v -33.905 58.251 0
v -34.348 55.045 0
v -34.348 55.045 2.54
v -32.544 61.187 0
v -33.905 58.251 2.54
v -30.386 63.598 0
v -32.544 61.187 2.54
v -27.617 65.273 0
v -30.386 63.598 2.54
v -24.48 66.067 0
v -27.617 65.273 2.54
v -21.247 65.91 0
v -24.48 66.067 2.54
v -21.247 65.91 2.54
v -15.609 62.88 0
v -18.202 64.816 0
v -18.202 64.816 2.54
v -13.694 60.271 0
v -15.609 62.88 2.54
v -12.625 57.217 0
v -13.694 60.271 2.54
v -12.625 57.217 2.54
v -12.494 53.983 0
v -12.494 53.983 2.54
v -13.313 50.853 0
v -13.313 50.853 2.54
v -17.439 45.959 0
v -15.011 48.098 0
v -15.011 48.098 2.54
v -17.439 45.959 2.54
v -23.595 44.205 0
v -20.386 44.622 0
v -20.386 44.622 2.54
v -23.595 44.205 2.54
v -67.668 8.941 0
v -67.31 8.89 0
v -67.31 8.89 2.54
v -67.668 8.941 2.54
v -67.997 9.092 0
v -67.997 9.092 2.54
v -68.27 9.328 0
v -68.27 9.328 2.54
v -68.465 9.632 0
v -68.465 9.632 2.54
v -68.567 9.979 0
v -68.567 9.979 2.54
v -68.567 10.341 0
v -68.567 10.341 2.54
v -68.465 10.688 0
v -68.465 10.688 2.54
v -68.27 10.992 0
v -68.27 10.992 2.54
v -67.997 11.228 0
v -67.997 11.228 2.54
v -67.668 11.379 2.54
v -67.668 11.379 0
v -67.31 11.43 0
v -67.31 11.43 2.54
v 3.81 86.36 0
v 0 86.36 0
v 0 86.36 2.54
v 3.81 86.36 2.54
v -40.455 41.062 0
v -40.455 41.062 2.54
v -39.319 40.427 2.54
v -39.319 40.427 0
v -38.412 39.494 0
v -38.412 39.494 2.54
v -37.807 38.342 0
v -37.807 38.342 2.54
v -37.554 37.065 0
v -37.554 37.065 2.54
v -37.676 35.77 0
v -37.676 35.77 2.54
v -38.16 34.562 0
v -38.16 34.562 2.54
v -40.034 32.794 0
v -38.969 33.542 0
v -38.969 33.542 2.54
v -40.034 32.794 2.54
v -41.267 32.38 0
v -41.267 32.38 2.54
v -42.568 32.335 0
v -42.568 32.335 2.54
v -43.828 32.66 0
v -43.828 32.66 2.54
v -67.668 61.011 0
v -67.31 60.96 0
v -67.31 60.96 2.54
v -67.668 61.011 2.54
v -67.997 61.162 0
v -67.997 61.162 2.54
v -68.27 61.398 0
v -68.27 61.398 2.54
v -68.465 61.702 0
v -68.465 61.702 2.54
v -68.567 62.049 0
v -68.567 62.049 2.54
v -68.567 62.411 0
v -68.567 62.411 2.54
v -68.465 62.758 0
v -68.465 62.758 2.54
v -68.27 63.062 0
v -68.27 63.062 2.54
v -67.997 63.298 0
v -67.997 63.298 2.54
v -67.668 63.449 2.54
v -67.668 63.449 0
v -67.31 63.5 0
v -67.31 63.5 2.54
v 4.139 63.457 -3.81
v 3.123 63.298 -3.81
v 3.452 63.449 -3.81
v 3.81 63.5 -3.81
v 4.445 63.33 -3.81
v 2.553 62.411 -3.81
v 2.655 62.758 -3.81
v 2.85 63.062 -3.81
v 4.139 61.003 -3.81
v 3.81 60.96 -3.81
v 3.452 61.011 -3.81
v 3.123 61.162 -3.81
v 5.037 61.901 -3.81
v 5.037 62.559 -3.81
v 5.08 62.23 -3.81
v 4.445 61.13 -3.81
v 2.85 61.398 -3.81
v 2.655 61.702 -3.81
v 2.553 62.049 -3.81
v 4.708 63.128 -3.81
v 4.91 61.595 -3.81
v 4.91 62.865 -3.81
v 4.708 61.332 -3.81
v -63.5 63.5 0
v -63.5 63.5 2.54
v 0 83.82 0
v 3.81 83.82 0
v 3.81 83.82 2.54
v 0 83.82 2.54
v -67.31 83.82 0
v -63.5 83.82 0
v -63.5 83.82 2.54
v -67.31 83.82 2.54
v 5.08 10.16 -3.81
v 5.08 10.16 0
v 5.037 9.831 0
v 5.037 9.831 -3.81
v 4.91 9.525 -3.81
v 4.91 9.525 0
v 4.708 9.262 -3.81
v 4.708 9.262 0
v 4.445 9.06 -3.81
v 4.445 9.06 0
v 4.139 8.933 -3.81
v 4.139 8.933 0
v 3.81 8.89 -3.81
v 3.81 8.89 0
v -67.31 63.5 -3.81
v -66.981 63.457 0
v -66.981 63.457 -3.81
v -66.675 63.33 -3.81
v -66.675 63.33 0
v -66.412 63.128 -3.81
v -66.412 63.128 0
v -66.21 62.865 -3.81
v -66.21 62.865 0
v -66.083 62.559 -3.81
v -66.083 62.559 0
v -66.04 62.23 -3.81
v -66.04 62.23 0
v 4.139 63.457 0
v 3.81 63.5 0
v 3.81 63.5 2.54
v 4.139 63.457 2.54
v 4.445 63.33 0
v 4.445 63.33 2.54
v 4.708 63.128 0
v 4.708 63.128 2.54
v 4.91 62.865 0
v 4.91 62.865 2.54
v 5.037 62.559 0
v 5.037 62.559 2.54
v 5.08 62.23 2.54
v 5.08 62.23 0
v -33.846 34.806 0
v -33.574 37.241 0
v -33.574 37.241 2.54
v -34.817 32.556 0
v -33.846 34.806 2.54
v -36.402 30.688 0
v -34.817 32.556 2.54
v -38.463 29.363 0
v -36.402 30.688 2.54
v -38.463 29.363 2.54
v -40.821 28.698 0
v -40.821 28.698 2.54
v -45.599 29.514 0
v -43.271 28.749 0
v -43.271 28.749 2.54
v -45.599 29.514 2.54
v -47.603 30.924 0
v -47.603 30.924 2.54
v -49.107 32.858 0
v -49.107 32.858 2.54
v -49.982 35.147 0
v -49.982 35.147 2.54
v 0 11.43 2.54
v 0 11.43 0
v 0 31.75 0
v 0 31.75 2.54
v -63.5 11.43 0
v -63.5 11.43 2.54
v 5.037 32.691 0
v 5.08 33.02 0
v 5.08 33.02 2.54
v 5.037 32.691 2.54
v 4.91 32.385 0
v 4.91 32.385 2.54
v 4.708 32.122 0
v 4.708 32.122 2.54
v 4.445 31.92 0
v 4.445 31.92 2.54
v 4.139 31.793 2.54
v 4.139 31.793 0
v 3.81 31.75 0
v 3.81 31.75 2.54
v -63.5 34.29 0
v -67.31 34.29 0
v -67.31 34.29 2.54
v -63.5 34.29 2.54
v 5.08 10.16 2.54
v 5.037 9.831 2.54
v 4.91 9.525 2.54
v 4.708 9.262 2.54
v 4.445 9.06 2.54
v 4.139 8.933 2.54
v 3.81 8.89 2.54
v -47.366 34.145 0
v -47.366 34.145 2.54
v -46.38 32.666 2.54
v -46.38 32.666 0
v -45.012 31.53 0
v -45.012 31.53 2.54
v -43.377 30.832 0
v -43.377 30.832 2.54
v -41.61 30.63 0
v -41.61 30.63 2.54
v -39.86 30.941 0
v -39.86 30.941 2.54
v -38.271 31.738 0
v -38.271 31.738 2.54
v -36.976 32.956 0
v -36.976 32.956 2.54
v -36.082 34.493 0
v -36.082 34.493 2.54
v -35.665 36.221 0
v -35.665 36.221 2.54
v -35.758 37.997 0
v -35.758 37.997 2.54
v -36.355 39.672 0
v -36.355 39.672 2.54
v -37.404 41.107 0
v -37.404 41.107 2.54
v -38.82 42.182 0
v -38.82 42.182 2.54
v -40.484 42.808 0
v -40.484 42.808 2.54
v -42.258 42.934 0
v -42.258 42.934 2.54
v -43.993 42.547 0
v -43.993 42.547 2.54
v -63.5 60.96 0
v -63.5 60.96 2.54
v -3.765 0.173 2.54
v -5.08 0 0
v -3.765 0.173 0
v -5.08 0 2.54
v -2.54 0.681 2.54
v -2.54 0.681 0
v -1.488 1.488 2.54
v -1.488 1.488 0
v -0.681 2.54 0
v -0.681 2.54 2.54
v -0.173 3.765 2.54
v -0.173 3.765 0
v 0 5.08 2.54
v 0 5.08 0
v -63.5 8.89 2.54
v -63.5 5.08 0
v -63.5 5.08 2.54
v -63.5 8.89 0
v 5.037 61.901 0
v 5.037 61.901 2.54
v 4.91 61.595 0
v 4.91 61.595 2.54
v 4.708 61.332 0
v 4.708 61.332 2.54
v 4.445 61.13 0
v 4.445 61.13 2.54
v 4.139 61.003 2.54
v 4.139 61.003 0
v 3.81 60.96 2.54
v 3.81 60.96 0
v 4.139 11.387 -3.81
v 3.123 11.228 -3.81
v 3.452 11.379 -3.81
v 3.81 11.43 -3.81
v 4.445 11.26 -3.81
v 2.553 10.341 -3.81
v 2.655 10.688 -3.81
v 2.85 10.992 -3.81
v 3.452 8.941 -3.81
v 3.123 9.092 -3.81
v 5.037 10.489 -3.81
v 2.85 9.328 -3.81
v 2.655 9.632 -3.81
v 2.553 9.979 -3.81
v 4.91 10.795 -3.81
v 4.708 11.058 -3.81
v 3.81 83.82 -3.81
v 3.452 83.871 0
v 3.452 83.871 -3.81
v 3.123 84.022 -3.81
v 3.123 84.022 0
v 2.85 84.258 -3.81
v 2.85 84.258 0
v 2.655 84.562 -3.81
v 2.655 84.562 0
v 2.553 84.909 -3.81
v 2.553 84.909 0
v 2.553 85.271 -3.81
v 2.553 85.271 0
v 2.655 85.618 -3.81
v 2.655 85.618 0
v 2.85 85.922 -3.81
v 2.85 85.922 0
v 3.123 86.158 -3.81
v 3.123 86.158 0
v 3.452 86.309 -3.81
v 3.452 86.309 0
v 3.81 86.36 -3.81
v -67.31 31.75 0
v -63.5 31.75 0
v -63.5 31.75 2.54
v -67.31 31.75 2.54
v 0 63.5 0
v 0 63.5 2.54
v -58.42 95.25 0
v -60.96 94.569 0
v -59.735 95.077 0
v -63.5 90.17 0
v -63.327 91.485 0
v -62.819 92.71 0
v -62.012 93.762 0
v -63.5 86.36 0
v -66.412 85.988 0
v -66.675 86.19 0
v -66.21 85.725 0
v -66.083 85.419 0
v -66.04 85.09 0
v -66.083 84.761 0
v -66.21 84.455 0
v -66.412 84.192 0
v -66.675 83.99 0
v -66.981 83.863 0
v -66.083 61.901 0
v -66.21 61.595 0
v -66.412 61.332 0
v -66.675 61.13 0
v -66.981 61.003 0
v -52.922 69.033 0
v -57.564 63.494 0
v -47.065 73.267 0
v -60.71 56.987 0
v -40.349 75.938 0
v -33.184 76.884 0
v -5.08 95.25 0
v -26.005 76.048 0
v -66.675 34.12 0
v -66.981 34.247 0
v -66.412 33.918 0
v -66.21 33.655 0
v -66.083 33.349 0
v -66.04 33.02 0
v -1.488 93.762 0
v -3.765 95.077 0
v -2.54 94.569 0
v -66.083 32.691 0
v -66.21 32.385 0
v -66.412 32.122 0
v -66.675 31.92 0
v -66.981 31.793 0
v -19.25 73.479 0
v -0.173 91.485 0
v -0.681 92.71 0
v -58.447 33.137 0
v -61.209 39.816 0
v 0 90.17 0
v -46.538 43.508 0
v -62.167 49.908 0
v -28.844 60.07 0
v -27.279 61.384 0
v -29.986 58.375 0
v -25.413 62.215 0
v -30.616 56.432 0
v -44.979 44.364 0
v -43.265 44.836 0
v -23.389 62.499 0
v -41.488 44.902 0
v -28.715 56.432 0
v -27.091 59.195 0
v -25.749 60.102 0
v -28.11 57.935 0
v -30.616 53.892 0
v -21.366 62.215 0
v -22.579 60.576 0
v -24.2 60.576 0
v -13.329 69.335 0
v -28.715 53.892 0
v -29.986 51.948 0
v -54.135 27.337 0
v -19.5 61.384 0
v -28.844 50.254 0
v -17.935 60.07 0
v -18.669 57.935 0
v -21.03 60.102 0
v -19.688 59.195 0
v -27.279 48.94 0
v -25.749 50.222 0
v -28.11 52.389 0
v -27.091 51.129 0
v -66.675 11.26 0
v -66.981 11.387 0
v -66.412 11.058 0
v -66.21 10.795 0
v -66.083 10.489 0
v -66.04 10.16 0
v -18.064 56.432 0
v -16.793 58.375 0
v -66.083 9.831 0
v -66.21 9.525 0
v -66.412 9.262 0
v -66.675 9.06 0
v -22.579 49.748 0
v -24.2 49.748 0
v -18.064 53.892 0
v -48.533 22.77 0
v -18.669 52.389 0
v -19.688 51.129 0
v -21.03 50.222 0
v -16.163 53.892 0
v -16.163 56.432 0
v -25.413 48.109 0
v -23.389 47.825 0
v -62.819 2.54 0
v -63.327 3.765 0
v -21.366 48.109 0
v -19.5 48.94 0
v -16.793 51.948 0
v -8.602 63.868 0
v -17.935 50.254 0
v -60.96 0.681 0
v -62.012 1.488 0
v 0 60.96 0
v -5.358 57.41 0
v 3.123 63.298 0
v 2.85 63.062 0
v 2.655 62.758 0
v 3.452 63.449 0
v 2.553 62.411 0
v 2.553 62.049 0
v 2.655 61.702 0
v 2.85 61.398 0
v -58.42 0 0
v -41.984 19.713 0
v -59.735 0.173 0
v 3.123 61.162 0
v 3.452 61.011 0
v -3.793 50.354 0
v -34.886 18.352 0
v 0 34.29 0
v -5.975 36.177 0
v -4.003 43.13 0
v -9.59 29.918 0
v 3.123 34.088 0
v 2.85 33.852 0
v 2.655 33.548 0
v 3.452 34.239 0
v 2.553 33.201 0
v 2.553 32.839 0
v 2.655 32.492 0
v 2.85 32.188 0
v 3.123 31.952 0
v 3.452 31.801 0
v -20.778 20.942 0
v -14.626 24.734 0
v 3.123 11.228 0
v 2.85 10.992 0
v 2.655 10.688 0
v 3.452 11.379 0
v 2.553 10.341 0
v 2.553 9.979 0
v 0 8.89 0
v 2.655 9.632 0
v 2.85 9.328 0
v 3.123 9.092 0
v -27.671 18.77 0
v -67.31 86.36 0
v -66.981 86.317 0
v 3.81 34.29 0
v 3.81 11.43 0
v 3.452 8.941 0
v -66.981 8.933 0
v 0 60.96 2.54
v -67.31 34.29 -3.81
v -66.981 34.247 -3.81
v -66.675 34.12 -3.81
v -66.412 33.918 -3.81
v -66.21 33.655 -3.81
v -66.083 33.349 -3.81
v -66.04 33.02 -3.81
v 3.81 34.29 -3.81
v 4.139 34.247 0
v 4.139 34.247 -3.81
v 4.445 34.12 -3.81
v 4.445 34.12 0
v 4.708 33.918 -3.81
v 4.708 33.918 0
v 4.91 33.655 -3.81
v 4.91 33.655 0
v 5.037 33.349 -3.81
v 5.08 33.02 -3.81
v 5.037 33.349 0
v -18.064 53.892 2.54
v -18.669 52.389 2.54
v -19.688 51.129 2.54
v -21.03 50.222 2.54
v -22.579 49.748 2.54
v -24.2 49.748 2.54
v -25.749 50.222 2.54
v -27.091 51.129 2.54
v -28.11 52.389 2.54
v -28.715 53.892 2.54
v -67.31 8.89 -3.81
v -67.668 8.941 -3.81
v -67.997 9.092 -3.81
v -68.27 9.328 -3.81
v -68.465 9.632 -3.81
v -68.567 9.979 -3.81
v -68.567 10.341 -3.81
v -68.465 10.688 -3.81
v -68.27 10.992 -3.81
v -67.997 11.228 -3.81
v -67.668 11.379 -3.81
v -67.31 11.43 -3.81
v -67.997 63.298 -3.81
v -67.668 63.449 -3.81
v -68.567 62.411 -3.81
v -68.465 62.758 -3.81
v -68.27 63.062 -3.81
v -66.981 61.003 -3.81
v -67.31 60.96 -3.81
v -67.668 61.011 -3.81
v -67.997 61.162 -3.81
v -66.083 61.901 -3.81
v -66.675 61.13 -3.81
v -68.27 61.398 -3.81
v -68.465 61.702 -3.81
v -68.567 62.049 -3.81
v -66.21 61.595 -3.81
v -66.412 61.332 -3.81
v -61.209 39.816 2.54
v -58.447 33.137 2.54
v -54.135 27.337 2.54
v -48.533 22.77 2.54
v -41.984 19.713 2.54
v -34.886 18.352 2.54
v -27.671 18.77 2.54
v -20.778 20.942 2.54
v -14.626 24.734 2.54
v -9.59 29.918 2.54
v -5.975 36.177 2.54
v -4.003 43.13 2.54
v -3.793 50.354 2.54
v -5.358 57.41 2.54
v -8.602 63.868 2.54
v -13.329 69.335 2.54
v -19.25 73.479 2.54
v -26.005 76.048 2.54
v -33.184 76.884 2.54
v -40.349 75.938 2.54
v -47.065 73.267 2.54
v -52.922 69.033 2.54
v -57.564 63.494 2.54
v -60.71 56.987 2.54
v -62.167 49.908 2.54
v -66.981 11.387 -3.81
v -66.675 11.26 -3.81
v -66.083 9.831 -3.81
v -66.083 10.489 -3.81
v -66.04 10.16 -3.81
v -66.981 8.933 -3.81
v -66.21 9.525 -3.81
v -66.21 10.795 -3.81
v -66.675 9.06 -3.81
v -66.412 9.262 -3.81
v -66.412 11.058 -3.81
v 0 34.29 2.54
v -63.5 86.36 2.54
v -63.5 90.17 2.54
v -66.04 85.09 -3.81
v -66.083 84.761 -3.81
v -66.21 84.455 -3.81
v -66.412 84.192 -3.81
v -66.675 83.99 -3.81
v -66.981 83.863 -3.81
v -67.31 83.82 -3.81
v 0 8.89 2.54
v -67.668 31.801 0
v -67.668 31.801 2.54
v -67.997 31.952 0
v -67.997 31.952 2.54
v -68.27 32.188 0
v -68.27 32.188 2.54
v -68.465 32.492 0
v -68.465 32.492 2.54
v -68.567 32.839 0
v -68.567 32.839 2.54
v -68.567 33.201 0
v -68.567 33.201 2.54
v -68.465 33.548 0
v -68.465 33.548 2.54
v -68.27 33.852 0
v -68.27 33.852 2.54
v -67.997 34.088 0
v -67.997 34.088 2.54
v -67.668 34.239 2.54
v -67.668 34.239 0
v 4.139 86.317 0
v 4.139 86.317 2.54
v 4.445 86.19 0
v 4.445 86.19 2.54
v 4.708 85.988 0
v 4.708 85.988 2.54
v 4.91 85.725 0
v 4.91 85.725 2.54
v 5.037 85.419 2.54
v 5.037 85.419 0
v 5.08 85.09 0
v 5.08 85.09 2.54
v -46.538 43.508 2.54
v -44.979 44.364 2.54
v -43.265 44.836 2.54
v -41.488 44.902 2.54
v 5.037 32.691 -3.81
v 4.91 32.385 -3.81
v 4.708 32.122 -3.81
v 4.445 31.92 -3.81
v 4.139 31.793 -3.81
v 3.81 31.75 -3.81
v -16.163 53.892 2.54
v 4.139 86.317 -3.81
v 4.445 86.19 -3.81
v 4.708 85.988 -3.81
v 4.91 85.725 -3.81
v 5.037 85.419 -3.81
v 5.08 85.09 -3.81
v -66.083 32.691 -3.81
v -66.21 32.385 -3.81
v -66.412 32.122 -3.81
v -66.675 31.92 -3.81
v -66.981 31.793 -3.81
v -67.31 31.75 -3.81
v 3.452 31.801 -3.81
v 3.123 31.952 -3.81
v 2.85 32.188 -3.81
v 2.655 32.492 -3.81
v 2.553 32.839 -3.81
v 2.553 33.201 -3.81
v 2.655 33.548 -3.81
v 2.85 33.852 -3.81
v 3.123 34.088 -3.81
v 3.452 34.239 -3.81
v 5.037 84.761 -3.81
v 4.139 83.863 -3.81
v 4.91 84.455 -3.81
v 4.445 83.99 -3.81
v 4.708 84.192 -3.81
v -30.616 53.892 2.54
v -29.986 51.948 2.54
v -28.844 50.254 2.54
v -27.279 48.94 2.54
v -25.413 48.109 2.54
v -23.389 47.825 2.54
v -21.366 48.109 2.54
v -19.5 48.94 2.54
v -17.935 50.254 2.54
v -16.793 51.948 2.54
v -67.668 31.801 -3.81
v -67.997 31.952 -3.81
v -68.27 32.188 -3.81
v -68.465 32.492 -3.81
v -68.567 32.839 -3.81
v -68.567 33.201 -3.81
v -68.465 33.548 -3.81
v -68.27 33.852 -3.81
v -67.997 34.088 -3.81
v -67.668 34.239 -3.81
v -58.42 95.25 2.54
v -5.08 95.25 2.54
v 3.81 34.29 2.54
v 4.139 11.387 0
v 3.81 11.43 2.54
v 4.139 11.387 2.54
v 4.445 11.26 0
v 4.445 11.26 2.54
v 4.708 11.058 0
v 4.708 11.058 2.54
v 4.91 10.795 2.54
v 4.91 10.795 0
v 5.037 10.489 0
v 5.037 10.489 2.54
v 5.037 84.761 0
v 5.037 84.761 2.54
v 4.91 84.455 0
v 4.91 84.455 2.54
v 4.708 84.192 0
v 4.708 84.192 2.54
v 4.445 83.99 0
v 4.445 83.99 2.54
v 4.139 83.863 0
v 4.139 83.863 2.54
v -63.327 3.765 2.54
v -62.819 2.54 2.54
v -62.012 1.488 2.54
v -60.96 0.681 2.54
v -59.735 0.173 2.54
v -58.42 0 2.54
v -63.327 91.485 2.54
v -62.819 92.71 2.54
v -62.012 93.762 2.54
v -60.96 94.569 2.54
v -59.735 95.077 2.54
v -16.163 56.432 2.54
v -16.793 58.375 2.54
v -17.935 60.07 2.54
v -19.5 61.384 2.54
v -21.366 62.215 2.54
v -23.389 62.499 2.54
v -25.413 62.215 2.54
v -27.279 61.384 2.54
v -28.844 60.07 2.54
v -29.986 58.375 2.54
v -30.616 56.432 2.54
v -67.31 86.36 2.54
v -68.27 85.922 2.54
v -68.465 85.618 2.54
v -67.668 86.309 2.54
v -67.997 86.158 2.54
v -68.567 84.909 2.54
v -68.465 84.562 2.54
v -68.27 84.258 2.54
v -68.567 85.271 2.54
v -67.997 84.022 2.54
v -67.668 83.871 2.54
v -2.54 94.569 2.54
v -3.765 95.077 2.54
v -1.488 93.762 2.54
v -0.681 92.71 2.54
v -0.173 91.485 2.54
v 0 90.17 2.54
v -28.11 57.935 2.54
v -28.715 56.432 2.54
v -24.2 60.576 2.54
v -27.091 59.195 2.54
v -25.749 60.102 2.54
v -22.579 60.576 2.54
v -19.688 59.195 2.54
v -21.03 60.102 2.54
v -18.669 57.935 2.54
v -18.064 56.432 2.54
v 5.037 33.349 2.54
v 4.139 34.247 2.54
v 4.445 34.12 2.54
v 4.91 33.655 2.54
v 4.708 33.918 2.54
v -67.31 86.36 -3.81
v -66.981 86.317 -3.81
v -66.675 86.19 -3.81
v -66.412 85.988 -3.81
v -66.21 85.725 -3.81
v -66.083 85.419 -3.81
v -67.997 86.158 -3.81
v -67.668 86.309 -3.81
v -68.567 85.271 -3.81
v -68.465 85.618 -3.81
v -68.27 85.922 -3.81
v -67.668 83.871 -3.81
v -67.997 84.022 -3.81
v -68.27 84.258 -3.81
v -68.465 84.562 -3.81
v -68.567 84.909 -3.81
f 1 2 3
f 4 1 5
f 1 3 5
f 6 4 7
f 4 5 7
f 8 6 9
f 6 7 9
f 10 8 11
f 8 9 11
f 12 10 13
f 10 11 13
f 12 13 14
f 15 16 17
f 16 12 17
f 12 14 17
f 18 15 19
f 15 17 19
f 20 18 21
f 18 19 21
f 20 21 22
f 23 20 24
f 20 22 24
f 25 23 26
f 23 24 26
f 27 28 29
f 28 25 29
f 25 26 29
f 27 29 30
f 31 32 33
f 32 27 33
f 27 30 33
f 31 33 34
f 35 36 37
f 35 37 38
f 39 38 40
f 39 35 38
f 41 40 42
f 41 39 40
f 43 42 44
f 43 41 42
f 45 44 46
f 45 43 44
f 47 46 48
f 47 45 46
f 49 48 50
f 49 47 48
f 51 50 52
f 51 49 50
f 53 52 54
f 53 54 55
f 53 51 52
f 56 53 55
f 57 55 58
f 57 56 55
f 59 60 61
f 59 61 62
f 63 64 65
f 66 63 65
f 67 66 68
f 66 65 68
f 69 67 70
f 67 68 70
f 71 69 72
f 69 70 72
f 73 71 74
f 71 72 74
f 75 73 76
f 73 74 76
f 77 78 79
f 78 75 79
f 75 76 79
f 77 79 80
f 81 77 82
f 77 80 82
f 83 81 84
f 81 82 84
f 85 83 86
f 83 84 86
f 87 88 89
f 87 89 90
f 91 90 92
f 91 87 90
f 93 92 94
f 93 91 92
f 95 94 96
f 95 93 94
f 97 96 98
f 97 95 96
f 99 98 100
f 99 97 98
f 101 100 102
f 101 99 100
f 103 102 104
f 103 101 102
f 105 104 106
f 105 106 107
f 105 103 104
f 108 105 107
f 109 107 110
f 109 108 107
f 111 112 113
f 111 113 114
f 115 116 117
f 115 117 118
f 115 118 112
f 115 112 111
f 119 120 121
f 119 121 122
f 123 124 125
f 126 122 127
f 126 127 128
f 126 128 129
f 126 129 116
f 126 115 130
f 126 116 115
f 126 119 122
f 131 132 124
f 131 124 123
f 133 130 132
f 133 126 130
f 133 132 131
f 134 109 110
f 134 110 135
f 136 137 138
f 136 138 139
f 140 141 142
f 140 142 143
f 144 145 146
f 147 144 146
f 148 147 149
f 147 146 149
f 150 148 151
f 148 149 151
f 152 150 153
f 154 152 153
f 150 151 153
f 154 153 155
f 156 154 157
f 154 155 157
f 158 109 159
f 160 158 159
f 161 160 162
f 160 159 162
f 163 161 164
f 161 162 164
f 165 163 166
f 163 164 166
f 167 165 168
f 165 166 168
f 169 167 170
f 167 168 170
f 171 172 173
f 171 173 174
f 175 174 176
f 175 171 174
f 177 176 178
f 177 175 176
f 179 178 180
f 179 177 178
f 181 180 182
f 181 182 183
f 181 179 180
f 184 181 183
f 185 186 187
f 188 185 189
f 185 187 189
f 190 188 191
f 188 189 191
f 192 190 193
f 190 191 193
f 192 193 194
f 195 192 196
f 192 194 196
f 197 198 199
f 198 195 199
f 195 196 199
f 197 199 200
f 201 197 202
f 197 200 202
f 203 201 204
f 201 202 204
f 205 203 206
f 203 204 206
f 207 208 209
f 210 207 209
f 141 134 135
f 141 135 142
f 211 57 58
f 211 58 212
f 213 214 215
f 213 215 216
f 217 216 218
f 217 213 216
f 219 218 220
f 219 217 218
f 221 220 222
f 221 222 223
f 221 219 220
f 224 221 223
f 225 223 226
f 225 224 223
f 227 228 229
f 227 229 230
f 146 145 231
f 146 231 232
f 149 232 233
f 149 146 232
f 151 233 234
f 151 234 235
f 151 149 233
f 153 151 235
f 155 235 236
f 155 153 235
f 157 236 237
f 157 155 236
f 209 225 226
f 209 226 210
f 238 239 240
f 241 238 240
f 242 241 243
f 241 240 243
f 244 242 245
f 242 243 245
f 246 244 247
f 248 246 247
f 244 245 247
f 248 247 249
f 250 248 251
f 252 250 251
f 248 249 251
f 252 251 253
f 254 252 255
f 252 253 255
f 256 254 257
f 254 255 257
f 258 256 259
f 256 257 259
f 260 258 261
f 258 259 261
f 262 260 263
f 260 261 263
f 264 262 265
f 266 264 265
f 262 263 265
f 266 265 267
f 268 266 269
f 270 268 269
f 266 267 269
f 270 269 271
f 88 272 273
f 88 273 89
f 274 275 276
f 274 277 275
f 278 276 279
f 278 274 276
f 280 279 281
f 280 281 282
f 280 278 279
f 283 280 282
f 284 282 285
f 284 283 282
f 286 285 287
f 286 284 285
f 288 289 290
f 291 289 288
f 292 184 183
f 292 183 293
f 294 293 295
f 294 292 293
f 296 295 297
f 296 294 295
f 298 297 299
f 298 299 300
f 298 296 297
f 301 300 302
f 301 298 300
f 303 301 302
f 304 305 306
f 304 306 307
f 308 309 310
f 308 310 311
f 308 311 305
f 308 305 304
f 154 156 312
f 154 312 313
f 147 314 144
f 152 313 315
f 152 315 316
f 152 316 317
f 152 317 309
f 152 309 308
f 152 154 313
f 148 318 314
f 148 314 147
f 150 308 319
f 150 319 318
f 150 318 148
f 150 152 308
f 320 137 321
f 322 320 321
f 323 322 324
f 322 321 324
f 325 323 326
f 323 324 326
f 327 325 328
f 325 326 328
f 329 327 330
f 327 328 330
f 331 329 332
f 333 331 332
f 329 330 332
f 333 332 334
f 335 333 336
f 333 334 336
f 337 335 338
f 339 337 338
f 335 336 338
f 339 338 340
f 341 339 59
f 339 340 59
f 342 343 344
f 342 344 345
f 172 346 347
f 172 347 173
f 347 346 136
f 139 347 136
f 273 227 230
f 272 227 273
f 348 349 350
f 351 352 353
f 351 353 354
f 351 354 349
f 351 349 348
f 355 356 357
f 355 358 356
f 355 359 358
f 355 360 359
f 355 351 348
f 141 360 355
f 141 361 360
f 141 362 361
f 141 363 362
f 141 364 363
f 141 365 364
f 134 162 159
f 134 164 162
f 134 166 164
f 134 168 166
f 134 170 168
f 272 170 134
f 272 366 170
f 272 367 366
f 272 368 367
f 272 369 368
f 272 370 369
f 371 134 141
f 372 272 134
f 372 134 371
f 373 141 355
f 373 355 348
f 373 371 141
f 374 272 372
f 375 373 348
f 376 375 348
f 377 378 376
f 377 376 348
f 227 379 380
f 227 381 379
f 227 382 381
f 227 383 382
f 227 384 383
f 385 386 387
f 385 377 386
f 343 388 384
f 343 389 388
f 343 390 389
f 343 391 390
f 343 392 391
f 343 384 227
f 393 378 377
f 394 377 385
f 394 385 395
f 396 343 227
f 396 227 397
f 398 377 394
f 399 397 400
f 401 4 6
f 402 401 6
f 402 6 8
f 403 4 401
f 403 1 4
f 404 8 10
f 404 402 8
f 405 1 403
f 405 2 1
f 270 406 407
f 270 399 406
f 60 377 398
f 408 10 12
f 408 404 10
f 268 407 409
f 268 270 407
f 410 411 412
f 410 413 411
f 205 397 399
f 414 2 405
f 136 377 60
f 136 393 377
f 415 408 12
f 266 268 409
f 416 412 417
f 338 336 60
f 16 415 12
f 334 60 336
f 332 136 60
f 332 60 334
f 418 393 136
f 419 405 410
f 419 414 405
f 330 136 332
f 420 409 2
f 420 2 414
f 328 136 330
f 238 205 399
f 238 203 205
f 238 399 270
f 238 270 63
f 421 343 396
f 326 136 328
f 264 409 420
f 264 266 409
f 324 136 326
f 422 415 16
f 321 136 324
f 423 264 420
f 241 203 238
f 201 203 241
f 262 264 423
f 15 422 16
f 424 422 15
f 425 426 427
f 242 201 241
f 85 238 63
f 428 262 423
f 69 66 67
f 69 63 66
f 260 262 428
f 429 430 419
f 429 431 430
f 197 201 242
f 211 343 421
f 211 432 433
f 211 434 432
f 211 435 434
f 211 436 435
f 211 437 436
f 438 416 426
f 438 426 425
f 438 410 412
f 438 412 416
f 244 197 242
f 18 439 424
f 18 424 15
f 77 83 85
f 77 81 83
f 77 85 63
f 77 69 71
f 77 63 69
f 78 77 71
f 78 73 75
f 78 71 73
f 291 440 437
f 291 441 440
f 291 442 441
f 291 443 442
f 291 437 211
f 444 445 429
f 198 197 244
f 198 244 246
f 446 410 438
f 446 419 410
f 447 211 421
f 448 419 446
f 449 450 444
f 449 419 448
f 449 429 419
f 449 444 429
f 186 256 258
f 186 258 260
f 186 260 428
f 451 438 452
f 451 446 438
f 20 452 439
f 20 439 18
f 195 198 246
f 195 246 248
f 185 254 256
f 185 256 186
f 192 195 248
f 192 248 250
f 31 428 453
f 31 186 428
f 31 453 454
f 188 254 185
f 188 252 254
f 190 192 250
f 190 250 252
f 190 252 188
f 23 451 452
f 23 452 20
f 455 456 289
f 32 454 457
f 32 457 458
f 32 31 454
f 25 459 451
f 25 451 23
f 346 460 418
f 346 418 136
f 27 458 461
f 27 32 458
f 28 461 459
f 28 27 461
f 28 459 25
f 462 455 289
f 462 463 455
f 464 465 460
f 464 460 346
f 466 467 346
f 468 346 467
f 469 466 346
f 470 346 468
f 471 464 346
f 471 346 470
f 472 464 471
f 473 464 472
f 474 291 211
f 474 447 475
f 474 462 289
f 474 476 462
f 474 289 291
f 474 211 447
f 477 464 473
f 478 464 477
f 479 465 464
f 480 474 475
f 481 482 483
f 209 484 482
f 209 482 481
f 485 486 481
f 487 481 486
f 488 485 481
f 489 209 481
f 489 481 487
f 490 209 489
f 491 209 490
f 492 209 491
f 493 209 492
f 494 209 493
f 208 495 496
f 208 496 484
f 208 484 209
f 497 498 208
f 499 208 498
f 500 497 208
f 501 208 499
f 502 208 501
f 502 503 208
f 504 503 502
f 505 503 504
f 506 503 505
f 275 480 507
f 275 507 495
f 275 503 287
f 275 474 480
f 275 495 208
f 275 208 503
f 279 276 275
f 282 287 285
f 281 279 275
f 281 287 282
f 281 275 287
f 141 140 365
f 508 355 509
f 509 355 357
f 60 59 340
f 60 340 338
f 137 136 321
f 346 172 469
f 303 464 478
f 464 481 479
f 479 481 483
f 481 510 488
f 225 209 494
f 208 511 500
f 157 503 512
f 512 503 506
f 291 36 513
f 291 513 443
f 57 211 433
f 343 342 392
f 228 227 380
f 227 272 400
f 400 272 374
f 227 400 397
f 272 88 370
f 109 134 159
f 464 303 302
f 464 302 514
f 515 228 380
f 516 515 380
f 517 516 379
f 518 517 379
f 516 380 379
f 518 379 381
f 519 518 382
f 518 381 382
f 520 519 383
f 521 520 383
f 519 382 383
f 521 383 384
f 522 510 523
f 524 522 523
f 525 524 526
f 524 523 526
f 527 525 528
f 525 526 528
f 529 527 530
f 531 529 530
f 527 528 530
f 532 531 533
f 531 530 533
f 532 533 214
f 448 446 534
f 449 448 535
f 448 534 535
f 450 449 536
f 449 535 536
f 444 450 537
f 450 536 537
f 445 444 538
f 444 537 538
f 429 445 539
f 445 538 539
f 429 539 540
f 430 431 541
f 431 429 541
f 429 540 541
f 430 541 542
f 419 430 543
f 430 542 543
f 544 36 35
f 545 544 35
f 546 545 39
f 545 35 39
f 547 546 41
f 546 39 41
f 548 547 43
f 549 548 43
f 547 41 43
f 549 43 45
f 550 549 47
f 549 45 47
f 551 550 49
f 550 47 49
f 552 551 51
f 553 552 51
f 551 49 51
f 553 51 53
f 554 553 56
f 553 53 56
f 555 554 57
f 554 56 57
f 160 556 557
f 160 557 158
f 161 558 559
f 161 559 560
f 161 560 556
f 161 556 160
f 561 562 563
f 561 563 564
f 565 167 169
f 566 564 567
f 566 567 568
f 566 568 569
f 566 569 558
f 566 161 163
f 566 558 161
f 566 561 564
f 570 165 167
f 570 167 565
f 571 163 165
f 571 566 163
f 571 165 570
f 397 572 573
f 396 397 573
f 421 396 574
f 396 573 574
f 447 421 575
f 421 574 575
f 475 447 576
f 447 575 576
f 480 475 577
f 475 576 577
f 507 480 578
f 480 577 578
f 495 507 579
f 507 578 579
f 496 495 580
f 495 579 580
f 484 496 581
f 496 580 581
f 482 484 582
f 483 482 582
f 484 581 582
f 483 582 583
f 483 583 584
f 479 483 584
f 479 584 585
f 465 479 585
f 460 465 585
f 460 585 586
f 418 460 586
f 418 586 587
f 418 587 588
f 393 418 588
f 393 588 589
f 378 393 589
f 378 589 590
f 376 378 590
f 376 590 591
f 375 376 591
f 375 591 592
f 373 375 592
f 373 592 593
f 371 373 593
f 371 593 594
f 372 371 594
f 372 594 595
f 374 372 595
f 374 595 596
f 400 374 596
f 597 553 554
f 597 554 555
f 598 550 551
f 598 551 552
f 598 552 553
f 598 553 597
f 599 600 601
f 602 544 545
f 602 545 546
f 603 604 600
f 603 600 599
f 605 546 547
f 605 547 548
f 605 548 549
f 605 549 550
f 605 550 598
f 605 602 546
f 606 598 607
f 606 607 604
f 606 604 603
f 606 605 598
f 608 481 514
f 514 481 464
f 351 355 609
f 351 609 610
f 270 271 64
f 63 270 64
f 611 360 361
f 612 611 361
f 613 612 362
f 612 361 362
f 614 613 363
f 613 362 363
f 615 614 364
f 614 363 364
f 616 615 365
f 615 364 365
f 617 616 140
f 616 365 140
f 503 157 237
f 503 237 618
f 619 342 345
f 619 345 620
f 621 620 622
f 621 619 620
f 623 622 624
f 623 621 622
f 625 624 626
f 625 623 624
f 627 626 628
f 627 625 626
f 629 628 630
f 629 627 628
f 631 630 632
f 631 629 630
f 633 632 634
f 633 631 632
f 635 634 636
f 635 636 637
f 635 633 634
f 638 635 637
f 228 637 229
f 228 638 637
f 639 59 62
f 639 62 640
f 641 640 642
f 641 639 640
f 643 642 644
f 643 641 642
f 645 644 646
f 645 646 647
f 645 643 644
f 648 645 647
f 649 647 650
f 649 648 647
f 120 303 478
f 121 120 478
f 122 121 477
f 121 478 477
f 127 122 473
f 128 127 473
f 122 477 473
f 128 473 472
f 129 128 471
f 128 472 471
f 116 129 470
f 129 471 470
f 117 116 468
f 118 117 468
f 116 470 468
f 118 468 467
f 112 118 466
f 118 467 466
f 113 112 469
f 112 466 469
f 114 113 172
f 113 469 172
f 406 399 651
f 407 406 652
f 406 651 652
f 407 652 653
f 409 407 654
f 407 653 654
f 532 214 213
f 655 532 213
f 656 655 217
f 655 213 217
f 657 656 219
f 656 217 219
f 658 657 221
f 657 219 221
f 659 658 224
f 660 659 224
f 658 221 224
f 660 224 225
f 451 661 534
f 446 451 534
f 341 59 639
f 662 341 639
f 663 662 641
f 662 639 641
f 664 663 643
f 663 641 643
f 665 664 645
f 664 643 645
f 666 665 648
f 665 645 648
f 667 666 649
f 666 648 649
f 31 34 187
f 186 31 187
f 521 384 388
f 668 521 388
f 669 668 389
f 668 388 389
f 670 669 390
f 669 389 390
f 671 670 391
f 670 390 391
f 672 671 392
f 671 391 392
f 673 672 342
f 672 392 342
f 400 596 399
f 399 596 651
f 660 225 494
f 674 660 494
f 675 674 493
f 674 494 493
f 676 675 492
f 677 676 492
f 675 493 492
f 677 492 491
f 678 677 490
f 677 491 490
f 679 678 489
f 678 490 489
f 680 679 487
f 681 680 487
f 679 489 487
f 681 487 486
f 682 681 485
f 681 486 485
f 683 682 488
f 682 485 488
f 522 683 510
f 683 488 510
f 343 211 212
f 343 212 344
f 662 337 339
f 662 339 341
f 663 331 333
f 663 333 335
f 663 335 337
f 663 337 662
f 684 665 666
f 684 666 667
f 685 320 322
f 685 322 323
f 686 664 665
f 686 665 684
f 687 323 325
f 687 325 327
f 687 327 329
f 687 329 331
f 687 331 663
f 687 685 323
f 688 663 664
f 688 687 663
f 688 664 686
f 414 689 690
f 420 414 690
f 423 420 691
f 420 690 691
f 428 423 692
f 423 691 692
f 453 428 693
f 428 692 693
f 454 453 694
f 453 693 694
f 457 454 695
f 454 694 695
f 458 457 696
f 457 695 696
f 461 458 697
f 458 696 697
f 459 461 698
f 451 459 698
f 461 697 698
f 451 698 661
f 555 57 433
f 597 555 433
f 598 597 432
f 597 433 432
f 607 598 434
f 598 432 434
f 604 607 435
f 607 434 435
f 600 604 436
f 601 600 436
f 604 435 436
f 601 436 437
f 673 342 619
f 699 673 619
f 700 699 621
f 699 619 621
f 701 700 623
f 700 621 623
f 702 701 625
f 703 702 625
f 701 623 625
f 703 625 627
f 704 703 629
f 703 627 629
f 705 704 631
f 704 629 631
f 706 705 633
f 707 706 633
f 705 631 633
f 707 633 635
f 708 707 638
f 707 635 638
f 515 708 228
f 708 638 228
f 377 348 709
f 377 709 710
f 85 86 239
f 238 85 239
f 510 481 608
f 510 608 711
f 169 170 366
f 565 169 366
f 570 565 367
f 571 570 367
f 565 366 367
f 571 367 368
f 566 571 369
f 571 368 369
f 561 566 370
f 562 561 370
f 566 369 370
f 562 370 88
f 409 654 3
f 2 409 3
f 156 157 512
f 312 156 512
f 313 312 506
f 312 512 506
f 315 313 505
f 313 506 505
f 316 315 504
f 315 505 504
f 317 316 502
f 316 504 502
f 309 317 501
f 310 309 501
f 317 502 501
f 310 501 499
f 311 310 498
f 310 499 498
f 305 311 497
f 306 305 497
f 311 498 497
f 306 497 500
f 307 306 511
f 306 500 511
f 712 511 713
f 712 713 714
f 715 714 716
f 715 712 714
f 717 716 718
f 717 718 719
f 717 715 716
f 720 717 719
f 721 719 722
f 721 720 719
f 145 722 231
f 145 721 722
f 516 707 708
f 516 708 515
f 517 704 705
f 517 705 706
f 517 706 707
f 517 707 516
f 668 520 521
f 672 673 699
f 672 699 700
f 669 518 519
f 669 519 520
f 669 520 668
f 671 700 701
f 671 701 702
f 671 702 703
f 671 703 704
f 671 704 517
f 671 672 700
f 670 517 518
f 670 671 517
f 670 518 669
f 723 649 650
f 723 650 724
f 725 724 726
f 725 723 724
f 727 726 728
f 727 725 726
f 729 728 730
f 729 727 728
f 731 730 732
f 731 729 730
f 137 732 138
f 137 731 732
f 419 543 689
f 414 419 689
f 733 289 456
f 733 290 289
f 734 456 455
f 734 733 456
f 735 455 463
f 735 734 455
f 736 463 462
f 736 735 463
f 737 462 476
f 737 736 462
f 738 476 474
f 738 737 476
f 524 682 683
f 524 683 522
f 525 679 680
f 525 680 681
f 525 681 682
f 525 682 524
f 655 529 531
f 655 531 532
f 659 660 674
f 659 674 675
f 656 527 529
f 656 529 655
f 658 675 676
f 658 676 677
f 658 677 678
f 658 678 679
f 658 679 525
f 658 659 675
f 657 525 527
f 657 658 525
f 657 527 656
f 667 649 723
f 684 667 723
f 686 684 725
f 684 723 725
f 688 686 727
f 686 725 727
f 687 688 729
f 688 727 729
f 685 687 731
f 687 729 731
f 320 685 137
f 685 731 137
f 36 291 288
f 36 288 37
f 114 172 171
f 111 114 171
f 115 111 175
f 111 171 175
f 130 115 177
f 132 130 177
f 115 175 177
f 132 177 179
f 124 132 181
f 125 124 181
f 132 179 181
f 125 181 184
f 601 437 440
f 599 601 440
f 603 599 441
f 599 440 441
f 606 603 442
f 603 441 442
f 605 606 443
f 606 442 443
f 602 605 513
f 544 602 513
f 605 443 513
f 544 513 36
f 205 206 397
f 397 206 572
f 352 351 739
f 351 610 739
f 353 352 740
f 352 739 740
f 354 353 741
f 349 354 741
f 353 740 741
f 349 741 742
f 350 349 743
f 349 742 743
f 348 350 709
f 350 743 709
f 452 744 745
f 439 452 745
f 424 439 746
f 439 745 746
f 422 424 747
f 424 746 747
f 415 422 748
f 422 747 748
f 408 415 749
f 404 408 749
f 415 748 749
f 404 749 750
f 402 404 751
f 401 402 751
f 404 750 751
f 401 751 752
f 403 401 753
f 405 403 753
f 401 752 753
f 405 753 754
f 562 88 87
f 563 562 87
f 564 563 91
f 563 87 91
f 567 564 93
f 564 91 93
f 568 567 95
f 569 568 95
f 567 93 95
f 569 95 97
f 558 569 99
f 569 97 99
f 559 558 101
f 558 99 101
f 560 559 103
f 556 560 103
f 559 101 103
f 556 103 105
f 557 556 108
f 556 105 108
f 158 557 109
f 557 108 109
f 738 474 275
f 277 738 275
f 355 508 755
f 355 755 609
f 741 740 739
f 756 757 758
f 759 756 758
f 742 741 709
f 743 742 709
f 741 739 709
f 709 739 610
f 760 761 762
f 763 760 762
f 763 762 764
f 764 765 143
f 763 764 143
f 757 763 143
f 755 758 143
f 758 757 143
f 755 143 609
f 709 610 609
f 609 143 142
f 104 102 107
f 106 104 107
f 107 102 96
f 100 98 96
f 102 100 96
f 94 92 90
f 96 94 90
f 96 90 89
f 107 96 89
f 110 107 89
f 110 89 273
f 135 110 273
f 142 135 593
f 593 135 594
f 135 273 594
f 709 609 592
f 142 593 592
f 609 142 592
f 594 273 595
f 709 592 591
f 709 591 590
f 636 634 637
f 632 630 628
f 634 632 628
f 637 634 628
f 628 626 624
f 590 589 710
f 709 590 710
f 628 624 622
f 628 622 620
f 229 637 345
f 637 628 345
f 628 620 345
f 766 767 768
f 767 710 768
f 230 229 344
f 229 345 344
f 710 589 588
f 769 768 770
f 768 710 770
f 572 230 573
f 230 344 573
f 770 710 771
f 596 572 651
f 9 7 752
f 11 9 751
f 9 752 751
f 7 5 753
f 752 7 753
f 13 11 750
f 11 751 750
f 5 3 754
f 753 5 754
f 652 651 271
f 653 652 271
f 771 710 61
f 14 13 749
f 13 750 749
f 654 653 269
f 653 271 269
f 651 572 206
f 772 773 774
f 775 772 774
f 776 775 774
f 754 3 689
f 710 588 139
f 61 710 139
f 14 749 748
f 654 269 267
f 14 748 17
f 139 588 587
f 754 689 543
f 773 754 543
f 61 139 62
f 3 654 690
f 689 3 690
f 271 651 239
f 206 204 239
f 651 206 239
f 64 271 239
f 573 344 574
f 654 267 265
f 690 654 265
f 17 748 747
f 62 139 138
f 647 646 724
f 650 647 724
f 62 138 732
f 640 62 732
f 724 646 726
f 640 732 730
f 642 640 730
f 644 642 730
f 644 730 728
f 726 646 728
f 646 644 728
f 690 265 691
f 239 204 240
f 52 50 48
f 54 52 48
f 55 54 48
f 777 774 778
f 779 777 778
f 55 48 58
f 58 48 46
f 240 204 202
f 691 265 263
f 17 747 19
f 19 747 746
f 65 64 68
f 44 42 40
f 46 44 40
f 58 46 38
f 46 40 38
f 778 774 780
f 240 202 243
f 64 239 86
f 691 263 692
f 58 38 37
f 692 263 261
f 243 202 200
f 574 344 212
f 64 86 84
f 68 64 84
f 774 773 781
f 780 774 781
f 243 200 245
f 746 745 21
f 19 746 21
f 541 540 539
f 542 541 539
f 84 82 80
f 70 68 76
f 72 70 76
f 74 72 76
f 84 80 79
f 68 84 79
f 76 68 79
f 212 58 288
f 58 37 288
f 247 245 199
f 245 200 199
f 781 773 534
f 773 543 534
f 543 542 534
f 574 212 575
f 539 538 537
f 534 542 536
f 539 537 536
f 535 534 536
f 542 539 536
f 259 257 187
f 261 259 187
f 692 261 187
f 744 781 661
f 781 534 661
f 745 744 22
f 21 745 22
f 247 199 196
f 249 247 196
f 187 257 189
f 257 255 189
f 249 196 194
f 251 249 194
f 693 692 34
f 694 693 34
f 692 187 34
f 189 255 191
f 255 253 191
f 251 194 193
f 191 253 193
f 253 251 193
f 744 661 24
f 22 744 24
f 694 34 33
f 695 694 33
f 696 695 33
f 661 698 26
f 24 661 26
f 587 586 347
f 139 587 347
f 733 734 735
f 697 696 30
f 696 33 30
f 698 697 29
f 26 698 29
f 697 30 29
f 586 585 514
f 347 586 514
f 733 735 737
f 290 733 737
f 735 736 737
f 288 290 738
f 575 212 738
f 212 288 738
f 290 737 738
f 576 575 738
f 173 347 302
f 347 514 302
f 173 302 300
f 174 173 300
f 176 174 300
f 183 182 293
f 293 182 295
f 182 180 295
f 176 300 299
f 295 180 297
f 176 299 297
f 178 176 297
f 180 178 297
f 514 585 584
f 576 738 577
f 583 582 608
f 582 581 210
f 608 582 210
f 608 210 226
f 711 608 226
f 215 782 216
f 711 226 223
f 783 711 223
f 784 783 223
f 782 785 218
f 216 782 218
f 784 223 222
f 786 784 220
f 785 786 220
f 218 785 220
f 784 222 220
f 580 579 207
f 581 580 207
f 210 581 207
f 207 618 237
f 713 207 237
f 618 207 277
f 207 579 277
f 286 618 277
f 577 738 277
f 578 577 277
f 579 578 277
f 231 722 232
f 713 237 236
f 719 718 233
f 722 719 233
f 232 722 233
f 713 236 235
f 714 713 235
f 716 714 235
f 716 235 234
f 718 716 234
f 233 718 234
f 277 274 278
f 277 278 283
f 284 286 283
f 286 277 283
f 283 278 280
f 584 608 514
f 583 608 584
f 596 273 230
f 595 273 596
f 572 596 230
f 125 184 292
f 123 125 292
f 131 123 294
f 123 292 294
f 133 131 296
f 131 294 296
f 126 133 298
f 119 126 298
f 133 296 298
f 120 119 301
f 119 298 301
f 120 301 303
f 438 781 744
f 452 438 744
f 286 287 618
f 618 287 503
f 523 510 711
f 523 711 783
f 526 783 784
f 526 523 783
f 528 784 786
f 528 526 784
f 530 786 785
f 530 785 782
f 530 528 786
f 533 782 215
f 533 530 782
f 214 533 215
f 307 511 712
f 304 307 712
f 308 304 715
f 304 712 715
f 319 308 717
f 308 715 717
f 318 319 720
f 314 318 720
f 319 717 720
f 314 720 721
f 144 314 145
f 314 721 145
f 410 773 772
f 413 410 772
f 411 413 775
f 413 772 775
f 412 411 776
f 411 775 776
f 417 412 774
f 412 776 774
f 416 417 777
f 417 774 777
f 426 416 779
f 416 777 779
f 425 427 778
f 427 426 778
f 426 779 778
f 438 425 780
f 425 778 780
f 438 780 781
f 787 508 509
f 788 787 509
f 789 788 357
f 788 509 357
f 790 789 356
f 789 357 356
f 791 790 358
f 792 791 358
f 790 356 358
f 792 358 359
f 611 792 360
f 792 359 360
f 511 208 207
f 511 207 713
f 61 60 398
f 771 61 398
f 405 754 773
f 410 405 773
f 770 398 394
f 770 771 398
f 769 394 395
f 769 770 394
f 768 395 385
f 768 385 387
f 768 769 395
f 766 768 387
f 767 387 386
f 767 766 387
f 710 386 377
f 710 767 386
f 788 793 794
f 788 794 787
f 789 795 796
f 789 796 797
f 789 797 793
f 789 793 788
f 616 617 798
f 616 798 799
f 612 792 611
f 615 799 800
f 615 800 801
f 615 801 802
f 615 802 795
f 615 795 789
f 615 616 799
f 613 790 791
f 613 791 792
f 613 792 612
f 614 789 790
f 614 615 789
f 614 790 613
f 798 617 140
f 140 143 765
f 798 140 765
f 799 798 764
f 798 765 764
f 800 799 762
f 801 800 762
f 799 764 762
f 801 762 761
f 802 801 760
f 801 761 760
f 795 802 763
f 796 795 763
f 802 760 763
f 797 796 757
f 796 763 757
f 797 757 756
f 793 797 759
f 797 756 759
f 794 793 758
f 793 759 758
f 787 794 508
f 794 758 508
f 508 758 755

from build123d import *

# Parameters (mm, degrees)
F0_W          = 63.5
F0_H          = 95.25
F1_DEPTH      = 2.54
F2_R          = 5.08
F4_DEPTH      = 2.541
F6_DEPTH      = 2.54
F7_DEPTH      = 2.54
F7_DEPTH_BACK = 3.81


with BuildPart() as f1:
    # F0 (on Top) → F1 (new body)
    with BuildSketch(Plane.XY):
        with Locations((-31.75, 47.625)):
            Rectangle(F0_W, F0_H)
    extrude(amount=F1_DEPTH)

    # F2
    f2_edges = [f1.edges().sort_by_distance(p)[0] for p in [
        (-63.5, 0, 1.27),
        (0, 0, 1.27),
        (0, 95.25, 1.27),
        (-63.5, 95.25, 1.27),
    ]]
    fillet(f2_edges, radius=F2_R)

    # F3 (on face) → F4 (cut, through all)
    with BuildSketch(Plane.XY.offset(2.54)):
        with BuildLine():
            ThreePointArc((-28.7147323039, 56.4319934356), (-23.3894818135, 60.6365886522), (-18.0642313231, 56.4319934356))
            Line((-18.0642313231, 56.4319934356), (-16.1628100576, 56.4319934356))
            ThreePointArc((-16.1628100576, 56.4319934356), (-23.3894818135, 62.4994101926), (-30.6161535693, 56.4319934356))
            Line((-30.6161535693, 56.4319934356), (-28.7147323039, 56.4319934356))
        make_face()
        with BuildLine():
            Line((-16.1628100576, 53.8919934356), (-18.0642313231, 53.8919934356))
            ThreePointArc((-18.0642313231, 53.8919934356), (-23.3894818135, 49.687398219), (-28.7147323039, 53.8919934356))
            Line((-28.7147323039, 53.8919934356), (-30.6161535693, 53.8919934356))
            ThreePointArc((-30.6161535693, 53.8919934356), (-23.3894818135, 47.8245766785), (-16.1628100576, 53.8919934356))
        make_face()
        with BuildLine():
            ThreePointArc((-61.2091943622, 39.8156233132), (-3.7930509667, 50.3538420797), (-62.1665790677, 49.9079786241))
            Line((-62.1665790677, 49.9079786241), (-46.5377829969, 43.5084439814))
            ThreePointArc((-46.5377829969, 43.5084439814), (-44.1355102318, 44.6498304086), (-41.4878092706, 44.9015386403))
            Line((-41.4878092706, 44.9015386403), (-34.3481898308, 55.0450235605))
            ThreePointArc((-34.3481898308, 55.0450235605), (-15.6087357363, 62.8799564987), (-23.5952306539, 44.2045927048))
            Line((-23.5952306539, 44.2045927048), (-33.5741378367, 37.2411757708))
            ThreePointArc((-33.5741378367, 37.2411757708), (-40.8213137183, 28.6976707936), (-49.9820448458, 35.1470150054))
            Line((-49.9820448458, 35.1470150054), (-61.2091943622, 39.8156233132))
        make_face()
        with BuildLine():
            ThreePointArc((-47.366052866, 34.1452620924), (-36.0821241079, 34.4932892416), (-43.9929661581, 42.5472788847))
            Line((-43.9929661581, 42.5472788847), (-40.4547355891, 41.0624451561))
            ThreePointArc((-40.4547355891, 41.0624451561), (-37.8743531006, 35.1484300856), (-43.827822297, 32.6604283638))
            Line((-43.827822297, 32.6604283638), (-47.366052866, 34.1452620924))
        make_face()
    extrude(amount=-F4_DEPTH, mode=Mode.SUBTRACT)

    # F5 (on face) → F6 (join)
    with BuildSketch(Plane(origin=(0, 0, 0), x_dir=(1, 0, 0), z_dir=(0, 0, -1))):
        with BuildLine():
            Line((-63.5, -86.36), (-63.5, -83.82))
            Line((-63.5, -83.82), (-67.31, -83.82))
            ThreePointArc((-67.31, -83.82), (-66.4119743879, -84.1919743879), (-66.04, -85.09))
            ThreePointArc((-66.04, -85.09), (-66.4119743879, -85.9880256121), (-67.31, -86.36))
            Line((-67.31, -86.36), (-63.5, -86.36))
        make_face()
        with BuildLine():
            Line((-63.5, -63.5), (-63.5, -60.96))
            Line((-63.5, -60.96), (-67.31, -60.96))
            ThreePointArc((-67.31, -60.96), (-66.4119743879, -61.3319743879), (-66.04, -62.23))
            ThreePointArc((-66.04, -62.23), (-66.4119743879, -63.1280256121), (-67.31, -63.5))
            Line((-67.31, -63.5), (-63.5, -63.5))
        make_face()
        with BuildLine():
            Line((-63.5, -34.29), (-63.5, -31.75))
            Line((-63.5, -31.75), (-67.31, -31.75))
            ThreePointArc((-67.31, -31.75), (-66.4119743879, -32.1219743879), (-66.04, -33.02))
            ThreePointArc((-66.04, -33.02), (-66.4119743879, -33.9180256121), (-67.31, -34.29))
            Line((-67.31, -34.29), (-63.5, -34.29))
        make_face()
        with BuildLine():
            ThreePointArc((-67.31, -8.89), (-66.4119743879, -9.2619743879), (-66.04, -10.16))
            ThreePointArc((-66.04, -10.16), (-66.4119743879, -11.0580256121), (-67.31, -11.43))
            Line((-67.31, -11.43), (-63.5, -11.43))
            Line((-63.5, -11.43), (-63.5, -8.89))
            Line((-63.5, -8.89), (-67.31, -8.89))
        make_face()
        with BuildLine():
            Line((3.81, -8.89), (0, -8.89))
            Line((0, -8.89), (0, -11.43))
            Line((0, -11.43), (3.81, -11.43))
            ThreePointArc((3.81, -11.43), (2.54, -10.16), (3.81, -8.89))
        make_face()
        with BuildLine():
            Line((3.81, -31.75), (0, -31.75))
            Line((0, -31.75), (0, -34.29))
            Line((0, -34.29), (3.81, -34.29))
            ThreePointArc((3.81, -34.29), (2.54, -33.02), (3.81, -31.75))
        make_face()
        with BuildLine():
            Line((3.81, -60.96), (0, -60.96))
            Line((0, -60.96), (0, -63.5))
            Line((0, -63.5), (3.81, -63.5))
            ThreePointArc((3.81, -63.5), (2.54, -62.23), (3.81, -60.96))
        make_face()
        with BuildLine():
            Line((3.81, -83.82), (0, -83.82))
            Line((0, -83.82), (0, -86.36))
            Line((0, -86.36), (3.81, -86.36))
            ThreePointArc((3.81, -86.36), (2.54, -85.09), (3.81, -83.82))
        make_face()
    extrude(amount=-F6_DEPTH)

    # F5 (on face) → F7 (join, two sides)
    with BuildSketch(Plane(origin=(0, 0, 0), x_dir=(1, 0, 0), z_dir=(0, 0, -1))) as f7_sk:
        with BuildLine():
            ThreePointArc((-66.04, -85.09), (-66.4119743879, -84.1919743879), (-67.31, -83.82))
            ThreePointArc((-67.31, -83.82), (-68.58, -85.09), (-67.31, -86.36))
            ThreePointArc((-67.31, -86.36), (-66.4119743879, -85.9880256121), (-66.04, -85.09))
        make_face()
        with BuildLine():
            ThreePointArc((-66.04, -62.23), (-66.4119743879, -61.3319743879), (-67.31, -60.96))
            ThreePointArc((-67.31, -60.96), (-68.58, -62.23), (-67.31, -63.5))
            ThreePointArc((-67.31, -63.5), (-66.4119743879, -63.1280256121), (-66.04, -62.23))
        make_face()
        with BuildLine():
            ThreePointArc((-66.04, -33.02), (-66.4119743879, -32.1219743879), (-67.31, -31.75))
            ThreePointArc((-67.31, -31.75), (-68.58, -33.02), (-67.31, -34.29))
            ThreePointArc((-67.31, -34.29), (-66.4119743879, -33.9180256121), (-66.04, -33.02))
        make_face()
        with BuildLine():
            ThreePointArc((-67.31, -11.43), (-66.4119743879, -11.0580256121), (-66.04, -10.16))
            ThreePointArc((-66.04, -10.16), (-66.4119743879, -9.2619743879), (-67.31, -8.89))
            ThreePointArc((-67.31, -8.89), (-68.58, -10.16), (-67.31, -11.43))
        make_face()
        with BuildLine():
            ThreePointArc((5.08, -10.16), (4.7080256121, -9.2619743879), (3.81, -8.89))
            ThreePointArc((3.81, -8.89), (2.54, -10.16), (3.81, -11.43))
            ThreePointArc((3.81, -11.43), (4.7080256121, -11.0580256121), (5.08, -10.16))
        make_face()
        with BuildLine():
            ThreePointArc((5.08, -33.02), (4.7080256121, -32.1219743879), (3.81, -31.75))
            ThreePointArc((3.81, -31.75), (2.54, -33.02), (3.81, -34.29))
            ThreePointArc((3.81, -34.29), (4.7080256121, -33.9180256121), (5.08, -33.02))
        make_face()
        with BuildLine():
            ThreePointArc((5.08, -62.23), (4.7080256121, -61.3319743879), (3.81, -60.96))
            ThreePointArc((3.81, -60.96), (2.54, -62.23), (3.81, -63.5))
            ThreePointArc((3.81, -63.5), (4.7080256121, -63.1280256121), (5.08, -62.23))
        make_face()
        with BuildLine():
            ThreePointArc((5.08, -85.09), (4.7080256121, -84.1919743879), (3.81, -83.82))
            ThreePointArc((3.81, -83.82), (2.54, -85.09), (3.81, -86.36))
            ThreePointArc((3.81, -86.36), (4.7080256121, -85.9880256121), (5.08, -85.09))
        make_face()
    extrude(amount=-F7_DEPTH)
    extrude(f7_sk.sketch, amount=F7_DEPTH_BACK)


solid = f1.part
